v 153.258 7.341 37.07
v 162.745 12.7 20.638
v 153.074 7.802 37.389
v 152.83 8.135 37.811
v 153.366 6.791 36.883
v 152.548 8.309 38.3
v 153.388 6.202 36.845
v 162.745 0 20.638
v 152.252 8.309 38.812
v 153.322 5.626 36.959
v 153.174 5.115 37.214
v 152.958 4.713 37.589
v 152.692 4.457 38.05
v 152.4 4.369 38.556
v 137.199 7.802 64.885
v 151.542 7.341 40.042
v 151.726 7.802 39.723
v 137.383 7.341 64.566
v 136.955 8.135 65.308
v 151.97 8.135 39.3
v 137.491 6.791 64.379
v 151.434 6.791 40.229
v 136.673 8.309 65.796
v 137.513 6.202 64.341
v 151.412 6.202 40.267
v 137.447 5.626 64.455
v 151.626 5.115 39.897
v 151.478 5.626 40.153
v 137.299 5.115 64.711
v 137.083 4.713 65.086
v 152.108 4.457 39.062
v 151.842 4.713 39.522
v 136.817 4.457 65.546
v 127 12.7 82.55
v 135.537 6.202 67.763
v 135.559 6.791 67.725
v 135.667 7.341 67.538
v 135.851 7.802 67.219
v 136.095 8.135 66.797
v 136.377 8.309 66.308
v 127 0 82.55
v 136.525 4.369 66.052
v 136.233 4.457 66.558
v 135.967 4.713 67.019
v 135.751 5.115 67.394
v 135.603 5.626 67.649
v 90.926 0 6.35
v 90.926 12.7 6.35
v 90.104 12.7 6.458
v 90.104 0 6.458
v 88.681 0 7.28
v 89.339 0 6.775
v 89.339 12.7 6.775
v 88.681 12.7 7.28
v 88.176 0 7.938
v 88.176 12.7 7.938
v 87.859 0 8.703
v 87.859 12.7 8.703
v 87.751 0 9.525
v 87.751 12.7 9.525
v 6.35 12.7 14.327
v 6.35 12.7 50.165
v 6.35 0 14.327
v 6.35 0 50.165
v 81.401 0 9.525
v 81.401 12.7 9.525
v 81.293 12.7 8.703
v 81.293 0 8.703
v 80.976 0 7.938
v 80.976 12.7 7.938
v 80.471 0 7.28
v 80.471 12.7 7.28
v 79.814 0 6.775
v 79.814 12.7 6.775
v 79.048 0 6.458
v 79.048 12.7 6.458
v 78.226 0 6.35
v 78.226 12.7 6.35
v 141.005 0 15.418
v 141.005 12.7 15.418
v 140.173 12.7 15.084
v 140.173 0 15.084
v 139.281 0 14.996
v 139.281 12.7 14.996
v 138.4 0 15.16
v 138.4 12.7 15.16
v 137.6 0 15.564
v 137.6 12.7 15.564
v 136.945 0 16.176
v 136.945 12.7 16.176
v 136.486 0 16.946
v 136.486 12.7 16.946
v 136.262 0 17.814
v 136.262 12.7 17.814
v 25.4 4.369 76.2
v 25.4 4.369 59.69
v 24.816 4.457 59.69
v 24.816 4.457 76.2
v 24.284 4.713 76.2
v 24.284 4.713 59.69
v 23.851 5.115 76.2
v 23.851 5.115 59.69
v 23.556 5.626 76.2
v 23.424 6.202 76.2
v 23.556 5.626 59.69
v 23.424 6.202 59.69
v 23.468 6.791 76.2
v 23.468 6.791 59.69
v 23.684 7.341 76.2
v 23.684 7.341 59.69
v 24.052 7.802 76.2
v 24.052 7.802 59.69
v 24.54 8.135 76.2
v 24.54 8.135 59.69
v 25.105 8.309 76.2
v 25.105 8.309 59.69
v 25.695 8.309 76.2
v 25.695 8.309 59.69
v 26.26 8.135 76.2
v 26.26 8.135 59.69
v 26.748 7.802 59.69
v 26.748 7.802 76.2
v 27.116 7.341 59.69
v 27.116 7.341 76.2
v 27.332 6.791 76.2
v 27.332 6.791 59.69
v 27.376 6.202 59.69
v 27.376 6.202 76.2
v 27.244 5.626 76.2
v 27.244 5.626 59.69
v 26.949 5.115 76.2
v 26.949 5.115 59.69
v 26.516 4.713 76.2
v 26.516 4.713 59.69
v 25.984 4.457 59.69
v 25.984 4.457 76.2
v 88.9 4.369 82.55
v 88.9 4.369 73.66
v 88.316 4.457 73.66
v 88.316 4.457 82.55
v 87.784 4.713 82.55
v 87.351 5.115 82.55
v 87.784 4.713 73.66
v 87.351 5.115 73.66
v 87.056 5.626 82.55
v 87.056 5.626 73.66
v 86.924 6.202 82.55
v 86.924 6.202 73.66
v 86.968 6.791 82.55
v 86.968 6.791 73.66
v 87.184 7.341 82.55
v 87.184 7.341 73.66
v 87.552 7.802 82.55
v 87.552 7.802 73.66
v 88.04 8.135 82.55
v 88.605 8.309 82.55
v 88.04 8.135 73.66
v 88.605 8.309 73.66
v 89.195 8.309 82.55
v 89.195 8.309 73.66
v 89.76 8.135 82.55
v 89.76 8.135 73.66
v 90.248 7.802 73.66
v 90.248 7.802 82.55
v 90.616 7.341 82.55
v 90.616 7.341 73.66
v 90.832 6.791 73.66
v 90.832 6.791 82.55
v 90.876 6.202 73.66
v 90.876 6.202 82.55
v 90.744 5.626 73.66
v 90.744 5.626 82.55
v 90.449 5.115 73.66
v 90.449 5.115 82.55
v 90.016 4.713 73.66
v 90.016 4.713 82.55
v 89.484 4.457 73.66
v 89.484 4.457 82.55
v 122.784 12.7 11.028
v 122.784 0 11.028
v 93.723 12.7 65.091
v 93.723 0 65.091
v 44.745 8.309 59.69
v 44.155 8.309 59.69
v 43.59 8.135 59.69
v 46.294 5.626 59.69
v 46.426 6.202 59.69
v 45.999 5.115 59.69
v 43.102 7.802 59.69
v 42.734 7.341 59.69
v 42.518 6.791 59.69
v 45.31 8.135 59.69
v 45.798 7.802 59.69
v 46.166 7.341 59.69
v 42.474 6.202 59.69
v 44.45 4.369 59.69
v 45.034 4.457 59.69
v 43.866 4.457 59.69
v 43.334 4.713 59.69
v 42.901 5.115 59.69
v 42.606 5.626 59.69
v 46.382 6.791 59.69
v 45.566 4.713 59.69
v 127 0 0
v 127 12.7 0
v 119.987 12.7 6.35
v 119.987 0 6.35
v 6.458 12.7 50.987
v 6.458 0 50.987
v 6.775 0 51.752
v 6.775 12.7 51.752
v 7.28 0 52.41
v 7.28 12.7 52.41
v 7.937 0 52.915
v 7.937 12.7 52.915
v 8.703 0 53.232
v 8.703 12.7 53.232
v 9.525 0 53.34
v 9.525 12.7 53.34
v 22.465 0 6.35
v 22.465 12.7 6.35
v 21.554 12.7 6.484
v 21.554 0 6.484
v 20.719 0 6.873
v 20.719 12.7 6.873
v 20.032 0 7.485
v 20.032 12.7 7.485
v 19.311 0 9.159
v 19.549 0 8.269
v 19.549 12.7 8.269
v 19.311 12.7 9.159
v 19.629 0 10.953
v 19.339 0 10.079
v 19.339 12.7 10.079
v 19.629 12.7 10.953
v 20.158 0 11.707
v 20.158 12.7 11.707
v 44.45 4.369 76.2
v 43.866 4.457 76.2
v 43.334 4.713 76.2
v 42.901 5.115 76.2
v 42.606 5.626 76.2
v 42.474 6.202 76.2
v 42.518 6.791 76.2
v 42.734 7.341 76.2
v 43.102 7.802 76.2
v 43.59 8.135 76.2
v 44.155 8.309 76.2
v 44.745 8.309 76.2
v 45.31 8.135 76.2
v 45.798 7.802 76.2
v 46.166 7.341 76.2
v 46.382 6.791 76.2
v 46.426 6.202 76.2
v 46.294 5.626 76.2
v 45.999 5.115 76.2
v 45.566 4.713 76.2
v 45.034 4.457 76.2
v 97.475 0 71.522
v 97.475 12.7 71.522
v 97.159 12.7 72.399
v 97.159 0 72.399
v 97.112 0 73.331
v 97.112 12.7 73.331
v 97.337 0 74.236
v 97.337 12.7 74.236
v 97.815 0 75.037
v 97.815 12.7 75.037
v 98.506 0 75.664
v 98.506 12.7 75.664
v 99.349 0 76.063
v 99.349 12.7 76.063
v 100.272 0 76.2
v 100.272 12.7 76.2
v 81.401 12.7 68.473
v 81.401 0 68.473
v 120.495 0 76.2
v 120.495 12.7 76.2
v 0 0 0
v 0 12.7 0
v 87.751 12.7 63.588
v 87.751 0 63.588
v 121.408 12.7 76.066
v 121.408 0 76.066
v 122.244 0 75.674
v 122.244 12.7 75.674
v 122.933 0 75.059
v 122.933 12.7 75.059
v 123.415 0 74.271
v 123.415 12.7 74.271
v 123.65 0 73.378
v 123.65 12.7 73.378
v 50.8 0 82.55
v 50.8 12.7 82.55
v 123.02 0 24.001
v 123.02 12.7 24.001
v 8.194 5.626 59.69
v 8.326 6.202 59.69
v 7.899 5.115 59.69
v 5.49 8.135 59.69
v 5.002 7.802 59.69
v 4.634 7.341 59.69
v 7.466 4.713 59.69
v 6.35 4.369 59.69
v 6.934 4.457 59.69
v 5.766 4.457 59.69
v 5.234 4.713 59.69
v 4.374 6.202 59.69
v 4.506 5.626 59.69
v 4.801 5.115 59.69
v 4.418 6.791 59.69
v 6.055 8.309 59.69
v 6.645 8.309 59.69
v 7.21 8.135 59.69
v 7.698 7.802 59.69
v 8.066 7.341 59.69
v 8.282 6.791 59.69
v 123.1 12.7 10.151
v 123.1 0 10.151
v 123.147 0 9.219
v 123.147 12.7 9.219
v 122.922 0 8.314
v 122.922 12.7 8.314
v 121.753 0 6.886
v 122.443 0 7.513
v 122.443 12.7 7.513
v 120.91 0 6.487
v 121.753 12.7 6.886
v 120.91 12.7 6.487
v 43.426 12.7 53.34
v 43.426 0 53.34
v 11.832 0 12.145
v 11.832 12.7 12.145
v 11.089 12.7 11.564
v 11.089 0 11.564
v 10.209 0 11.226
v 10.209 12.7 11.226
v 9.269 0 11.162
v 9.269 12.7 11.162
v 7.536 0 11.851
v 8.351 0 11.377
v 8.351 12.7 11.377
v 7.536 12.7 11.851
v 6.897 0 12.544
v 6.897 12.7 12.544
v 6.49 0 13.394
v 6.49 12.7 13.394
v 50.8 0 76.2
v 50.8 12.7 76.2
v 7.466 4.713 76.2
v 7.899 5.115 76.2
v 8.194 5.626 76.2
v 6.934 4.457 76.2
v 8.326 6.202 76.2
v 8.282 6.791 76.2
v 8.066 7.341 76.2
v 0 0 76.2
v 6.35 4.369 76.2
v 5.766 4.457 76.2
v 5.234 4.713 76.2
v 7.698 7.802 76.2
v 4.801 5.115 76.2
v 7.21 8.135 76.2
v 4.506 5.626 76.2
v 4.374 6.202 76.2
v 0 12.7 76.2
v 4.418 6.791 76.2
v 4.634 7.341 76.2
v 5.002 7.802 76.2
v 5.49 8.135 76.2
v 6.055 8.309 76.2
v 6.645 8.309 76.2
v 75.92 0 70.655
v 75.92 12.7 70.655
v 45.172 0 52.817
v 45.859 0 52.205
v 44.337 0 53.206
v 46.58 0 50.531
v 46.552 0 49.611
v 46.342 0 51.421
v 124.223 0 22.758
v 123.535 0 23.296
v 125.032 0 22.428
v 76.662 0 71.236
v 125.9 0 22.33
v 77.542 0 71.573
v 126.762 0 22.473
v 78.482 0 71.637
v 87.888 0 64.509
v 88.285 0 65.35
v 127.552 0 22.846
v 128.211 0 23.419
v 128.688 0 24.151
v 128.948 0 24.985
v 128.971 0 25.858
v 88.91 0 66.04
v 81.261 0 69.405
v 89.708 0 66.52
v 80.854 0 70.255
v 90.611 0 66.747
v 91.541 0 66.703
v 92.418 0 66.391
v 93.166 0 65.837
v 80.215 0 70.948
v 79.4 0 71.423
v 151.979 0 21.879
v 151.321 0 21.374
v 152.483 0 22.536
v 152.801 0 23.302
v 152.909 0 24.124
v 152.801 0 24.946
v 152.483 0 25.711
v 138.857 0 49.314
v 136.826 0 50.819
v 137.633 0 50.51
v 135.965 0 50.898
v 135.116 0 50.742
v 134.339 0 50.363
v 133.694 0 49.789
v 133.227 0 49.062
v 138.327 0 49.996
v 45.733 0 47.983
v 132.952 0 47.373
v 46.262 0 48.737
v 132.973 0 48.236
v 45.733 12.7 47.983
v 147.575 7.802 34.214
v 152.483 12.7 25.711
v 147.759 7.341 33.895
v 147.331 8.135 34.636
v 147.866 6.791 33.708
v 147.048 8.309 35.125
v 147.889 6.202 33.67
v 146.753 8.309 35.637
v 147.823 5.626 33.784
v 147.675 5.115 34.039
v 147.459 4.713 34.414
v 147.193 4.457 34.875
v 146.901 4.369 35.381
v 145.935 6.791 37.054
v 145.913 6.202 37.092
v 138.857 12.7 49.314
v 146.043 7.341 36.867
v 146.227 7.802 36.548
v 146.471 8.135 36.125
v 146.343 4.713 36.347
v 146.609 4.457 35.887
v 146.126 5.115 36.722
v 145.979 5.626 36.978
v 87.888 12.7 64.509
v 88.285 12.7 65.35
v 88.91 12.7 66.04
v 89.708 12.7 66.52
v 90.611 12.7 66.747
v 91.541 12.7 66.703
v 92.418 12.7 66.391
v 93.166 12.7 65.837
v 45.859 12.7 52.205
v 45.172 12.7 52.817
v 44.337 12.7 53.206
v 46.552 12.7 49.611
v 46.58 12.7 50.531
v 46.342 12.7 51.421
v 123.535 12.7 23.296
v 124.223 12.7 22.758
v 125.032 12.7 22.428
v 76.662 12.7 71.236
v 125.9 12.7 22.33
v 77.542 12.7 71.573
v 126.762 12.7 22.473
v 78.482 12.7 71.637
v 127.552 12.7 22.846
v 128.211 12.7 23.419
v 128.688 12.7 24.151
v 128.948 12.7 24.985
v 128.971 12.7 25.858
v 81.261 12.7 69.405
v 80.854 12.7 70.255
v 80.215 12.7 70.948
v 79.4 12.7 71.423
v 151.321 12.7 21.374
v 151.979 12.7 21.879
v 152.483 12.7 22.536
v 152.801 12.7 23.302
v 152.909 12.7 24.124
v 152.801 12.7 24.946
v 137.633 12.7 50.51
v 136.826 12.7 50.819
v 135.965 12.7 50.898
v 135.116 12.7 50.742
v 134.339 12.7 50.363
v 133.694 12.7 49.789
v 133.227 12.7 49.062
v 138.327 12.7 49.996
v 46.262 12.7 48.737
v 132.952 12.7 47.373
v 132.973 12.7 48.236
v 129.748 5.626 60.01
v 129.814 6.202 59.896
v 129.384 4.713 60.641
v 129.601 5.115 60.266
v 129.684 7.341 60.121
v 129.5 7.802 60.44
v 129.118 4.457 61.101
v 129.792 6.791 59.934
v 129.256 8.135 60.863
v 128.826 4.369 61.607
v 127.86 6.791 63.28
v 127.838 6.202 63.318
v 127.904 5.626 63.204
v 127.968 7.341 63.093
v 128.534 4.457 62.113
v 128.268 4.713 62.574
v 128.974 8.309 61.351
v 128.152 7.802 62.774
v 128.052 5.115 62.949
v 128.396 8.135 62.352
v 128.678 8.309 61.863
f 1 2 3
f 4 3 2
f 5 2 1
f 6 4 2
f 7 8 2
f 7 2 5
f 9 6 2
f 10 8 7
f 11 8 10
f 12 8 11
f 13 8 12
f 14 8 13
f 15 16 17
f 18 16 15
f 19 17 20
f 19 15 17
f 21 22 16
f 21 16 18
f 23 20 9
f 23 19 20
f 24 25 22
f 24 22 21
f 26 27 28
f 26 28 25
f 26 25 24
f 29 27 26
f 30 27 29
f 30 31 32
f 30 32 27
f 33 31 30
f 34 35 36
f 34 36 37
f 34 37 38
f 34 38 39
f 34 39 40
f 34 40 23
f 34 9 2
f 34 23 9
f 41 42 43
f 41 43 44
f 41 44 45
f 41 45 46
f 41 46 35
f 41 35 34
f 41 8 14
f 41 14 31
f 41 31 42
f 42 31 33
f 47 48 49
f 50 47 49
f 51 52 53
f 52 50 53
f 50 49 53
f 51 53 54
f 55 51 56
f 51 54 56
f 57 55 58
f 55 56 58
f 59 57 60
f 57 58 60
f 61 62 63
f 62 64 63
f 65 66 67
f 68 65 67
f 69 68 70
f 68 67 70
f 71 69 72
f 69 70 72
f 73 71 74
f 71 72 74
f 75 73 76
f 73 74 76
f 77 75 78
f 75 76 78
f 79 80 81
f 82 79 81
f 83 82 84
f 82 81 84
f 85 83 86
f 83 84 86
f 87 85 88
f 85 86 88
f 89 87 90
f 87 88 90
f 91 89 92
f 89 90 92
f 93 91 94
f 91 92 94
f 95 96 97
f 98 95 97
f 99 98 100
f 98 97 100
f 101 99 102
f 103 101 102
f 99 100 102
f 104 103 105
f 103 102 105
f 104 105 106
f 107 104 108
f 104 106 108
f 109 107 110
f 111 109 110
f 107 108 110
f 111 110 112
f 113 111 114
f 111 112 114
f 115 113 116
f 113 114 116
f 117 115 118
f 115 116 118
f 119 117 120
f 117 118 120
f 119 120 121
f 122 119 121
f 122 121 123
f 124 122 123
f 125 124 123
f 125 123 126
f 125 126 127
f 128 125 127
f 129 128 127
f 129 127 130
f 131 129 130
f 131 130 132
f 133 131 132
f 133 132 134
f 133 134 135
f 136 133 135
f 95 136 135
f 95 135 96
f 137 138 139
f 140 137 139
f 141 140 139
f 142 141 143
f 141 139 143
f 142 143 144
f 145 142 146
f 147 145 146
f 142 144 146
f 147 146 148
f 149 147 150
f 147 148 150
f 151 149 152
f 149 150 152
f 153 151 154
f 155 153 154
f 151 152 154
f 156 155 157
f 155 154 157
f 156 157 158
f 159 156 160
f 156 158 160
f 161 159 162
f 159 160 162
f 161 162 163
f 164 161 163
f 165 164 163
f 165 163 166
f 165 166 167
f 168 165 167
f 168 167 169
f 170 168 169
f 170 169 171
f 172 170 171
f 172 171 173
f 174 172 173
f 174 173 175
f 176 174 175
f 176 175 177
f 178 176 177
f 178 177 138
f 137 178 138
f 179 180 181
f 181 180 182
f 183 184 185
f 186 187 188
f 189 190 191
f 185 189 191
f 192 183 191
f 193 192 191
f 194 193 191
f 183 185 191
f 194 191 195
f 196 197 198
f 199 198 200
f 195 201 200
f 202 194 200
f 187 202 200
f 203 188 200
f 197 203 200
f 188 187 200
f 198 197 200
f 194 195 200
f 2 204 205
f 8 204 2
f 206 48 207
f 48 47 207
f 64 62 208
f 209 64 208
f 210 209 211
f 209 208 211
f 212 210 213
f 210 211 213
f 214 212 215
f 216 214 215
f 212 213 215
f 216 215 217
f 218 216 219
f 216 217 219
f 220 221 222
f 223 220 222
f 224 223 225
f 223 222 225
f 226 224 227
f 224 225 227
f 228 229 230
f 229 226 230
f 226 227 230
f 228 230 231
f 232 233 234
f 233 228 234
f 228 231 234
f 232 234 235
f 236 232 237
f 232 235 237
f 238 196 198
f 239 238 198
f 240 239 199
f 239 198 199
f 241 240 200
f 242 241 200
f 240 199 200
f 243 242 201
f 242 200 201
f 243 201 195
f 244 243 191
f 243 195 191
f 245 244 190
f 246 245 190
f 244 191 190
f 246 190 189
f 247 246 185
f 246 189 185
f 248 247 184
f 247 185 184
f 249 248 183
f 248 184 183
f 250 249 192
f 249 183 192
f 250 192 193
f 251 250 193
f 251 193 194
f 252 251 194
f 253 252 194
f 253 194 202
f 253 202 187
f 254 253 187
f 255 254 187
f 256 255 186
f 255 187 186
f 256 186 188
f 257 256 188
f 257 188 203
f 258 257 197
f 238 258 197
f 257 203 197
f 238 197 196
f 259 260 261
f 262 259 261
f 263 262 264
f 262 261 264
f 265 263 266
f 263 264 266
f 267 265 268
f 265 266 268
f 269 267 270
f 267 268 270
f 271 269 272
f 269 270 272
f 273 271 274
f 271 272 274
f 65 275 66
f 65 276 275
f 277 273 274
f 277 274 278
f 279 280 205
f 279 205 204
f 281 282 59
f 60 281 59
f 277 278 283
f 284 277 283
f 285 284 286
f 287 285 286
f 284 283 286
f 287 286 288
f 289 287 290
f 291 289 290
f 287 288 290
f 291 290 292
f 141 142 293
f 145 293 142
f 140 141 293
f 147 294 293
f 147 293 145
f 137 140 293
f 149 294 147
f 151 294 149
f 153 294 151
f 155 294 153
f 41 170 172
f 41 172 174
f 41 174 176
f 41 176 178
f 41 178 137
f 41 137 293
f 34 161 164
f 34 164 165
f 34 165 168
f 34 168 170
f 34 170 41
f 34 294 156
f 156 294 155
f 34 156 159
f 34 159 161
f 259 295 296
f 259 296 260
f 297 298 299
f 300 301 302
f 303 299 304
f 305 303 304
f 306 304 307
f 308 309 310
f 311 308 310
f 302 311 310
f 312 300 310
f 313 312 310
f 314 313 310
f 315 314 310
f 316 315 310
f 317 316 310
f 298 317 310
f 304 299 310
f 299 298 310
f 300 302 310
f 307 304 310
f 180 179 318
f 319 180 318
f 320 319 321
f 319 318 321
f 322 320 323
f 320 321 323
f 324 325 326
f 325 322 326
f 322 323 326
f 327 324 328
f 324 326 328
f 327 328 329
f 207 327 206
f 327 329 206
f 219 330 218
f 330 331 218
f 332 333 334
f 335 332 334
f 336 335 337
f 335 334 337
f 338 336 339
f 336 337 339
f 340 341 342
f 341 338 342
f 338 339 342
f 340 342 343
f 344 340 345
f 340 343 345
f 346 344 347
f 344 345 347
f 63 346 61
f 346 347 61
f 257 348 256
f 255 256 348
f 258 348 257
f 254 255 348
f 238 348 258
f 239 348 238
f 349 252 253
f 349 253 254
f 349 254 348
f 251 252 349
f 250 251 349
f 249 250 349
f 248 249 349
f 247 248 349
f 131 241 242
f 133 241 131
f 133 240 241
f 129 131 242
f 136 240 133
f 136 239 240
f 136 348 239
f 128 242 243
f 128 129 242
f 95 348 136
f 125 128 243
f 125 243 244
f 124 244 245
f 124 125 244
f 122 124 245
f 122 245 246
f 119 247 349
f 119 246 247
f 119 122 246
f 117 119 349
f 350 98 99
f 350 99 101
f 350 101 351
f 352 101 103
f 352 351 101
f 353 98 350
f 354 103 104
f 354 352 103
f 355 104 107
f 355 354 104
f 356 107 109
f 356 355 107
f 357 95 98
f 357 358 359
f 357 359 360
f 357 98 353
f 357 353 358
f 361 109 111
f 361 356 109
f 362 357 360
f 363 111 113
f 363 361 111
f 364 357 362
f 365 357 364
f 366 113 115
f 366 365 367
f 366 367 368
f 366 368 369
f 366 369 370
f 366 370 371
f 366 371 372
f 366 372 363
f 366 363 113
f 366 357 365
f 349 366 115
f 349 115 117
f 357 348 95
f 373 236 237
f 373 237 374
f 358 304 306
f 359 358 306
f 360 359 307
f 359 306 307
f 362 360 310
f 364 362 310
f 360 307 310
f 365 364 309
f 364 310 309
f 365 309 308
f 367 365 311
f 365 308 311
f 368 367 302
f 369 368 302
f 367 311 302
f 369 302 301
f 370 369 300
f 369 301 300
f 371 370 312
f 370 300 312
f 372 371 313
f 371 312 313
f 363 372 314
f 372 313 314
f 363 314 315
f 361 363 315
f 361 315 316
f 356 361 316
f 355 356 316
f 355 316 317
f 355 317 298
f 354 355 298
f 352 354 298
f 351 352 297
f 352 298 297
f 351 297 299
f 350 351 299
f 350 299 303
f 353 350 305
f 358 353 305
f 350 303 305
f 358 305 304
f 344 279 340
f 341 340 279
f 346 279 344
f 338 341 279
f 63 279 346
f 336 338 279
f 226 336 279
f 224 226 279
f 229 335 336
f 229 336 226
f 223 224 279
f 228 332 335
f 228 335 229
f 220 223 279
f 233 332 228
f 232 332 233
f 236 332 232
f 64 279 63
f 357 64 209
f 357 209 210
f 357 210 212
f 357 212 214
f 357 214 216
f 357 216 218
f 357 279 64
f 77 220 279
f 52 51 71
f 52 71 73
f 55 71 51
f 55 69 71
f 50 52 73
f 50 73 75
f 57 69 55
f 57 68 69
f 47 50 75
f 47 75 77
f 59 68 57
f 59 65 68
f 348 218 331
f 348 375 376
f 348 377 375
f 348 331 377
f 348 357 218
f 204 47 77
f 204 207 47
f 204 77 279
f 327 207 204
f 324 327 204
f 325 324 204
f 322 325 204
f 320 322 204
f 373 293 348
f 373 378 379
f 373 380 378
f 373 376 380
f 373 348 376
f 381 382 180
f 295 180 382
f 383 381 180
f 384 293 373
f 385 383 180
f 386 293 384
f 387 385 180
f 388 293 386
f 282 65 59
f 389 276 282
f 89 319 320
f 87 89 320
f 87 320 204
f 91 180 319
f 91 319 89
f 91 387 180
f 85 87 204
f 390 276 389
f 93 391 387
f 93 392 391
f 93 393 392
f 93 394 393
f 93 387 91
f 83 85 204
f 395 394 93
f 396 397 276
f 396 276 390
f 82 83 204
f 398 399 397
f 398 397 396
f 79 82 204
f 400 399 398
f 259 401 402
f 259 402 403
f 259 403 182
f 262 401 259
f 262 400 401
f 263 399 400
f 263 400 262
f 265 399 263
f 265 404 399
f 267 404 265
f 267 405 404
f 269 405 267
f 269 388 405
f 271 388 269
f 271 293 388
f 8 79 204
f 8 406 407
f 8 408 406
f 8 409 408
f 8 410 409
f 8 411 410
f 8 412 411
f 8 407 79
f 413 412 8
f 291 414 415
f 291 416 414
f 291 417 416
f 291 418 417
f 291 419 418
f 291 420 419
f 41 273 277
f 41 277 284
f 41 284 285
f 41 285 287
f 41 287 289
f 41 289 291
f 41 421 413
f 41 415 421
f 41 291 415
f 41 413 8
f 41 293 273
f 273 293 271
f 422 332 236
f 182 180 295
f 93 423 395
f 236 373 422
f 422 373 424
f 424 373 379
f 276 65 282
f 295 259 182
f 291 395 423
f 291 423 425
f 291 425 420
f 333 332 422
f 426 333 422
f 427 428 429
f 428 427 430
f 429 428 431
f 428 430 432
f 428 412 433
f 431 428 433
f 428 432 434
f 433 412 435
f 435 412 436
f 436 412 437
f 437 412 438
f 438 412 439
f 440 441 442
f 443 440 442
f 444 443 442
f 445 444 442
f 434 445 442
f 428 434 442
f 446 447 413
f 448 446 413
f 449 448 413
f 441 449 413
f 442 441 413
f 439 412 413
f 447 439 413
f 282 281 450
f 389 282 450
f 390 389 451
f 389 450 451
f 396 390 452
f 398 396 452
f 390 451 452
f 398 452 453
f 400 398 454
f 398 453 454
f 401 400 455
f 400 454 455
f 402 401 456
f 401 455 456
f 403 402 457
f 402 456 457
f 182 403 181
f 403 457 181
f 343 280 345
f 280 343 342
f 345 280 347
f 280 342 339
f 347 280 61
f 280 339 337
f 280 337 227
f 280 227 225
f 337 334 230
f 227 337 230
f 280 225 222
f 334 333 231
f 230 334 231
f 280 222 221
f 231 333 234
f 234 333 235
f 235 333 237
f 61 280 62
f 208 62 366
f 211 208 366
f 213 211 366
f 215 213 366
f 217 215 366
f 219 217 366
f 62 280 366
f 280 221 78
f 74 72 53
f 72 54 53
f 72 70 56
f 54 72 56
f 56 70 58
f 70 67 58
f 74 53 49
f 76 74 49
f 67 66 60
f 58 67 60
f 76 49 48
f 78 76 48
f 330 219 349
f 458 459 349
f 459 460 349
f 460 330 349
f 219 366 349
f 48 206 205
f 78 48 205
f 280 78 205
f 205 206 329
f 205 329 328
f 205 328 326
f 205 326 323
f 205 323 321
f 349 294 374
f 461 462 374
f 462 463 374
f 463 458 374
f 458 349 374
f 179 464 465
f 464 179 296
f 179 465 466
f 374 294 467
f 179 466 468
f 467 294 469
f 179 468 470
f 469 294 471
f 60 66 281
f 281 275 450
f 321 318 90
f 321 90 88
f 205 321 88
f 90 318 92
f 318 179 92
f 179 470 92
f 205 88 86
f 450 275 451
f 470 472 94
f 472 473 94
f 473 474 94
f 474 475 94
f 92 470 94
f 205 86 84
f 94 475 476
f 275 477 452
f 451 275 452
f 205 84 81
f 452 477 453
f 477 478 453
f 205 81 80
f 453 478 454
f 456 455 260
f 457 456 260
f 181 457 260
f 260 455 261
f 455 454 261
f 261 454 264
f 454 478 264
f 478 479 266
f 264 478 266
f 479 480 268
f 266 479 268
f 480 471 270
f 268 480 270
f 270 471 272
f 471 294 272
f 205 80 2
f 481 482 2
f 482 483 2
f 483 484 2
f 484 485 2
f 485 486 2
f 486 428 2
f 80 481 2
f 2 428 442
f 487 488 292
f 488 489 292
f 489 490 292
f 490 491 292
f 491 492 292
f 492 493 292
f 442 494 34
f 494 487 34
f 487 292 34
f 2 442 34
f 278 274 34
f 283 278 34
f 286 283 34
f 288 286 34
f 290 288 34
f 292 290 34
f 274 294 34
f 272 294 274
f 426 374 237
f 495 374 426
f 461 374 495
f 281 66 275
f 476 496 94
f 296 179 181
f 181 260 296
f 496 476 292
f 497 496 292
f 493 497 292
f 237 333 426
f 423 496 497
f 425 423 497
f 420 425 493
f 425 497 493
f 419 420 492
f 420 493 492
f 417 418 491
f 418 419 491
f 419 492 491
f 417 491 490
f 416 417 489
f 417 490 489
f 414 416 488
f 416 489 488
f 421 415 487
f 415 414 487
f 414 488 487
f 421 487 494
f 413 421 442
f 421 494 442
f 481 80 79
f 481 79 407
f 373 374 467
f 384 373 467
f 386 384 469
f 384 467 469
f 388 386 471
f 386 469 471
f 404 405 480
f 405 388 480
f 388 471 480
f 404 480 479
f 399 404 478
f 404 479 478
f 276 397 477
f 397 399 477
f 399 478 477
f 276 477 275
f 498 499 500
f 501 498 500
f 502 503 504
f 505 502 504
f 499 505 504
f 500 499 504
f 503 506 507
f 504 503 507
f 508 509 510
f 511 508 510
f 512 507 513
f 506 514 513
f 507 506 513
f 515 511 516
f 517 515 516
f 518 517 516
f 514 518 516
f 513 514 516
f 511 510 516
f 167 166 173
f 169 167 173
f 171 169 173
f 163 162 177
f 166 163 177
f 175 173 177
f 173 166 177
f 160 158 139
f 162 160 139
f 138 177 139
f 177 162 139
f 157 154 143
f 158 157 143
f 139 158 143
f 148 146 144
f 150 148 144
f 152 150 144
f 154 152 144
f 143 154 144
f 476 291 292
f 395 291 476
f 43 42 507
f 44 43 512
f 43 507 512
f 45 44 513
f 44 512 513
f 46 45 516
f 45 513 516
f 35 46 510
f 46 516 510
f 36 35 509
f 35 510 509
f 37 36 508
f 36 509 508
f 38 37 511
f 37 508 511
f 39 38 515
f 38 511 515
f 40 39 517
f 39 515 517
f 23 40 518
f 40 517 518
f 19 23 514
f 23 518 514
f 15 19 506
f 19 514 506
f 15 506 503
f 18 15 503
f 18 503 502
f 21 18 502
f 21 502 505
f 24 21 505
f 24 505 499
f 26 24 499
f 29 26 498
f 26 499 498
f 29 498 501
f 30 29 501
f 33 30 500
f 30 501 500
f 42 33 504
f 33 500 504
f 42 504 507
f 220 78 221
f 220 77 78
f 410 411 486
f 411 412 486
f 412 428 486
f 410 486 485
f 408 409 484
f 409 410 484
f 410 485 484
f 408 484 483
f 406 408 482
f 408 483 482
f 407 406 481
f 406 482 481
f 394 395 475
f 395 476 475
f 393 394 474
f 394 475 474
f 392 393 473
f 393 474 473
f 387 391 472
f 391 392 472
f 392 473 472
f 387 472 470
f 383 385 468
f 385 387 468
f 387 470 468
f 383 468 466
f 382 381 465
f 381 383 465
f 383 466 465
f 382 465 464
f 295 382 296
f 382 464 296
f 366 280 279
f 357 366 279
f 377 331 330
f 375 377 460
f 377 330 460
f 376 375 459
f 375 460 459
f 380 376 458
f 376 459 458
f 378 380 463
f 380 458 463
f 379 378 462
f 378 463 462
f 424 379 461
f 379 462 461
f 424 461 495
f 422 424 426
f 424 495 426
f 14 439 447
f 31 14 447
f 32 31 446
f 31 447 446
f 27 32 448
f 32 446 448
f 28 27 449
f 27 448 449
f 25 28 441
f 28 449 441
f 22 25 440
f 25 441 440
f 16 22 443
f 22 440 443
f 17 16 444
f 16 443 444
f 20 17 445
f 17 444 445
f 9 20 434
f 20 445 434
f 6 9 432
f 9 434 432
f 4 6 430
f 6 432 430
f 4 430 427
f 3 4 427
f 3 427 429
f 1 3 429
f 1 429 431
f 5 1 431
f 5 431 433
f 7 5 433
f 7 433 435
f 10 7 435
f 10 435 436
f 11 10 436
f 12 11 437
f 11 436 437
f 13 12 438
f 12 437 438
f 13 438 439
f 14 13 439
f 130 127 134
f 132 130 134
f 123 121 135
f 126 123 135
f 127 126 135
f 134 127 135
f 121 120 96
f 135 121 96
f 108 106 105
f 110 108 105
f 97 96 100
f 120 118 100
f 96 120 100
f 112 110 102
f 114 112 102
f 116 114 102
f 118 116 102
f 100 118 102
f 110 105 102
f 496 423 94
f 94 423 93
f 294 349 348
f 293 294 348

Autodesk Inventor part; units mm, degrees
ref_plane "YZ Plane" through (0, 0, 0) normal (1, 0, 0) x (0, 1, 0)
ref_plane "XZ Plane" through (0, 0, 0) normal (0, 1, 0) x (-1, 0, 0)
ref_plane "XY Plane" through (0, 0, 0) normal (0, 0, 1) x (1, 0, 0)
sketch "Sketch1" plane through (0, 0, 0) normal (0, 0, 1) x (1, 0, 0)
  line L0 (0, 0) -> (50.8, 0)
  line L1 (50.8, 0) -> (50.8, 12.7)
  line L2 (50.8, 12.7) -> (0, 12.7)
  line L3 (0, 12.7) -> (0, 0)
  dimension "d0" = 50.8
  dimension "d1" = 12.7
extrude "Extrusion1" add sketch "Sketch1" along normal blind 76.2
sketch "Sketch2" plane through (0, 0, 76.2) normal (0, 0, 1) x (1, 0, 0)
  line L0 (50.8, 12.7) -> (0, 12.7) construction
  line L1 (50.8, 0) -> (50.8, 12.7) construction
  line L2 (0, 12.7) -> (50.8, 12.7) construction
  line L3 (50.8, 12.7) -> (50.8, 6.35) construction
  line L4 (50.8, 6.35) -> (0, 6.35) construction
  line L5 (0, 6.35) -> (0, 12.7) construction
  point P0 (0, 0)
  point P1 (25.4, 6.35)
  point P2 (6.35, 6.35)
  point P3 (44.45, 6.35)
  dimension "d4" = 6.35
  dimension "d5" = 19.05
  dimension "d6" = 19.05
hole "Hole1" at (25.4, 6.35, 76.2) at (6.35, 6.35, 76.2) at (44.45, 6.35, 76.2) direction (0, 0, -1) diameter 3.9624 depth 16.51 thread size "10-32 UNF" class "2B" standard "ANSI Unified Screw Threads"
sketch "Sketch3" plane through (50.8, 0, 0) normal (1, 0, 0) x (0, 0, -1)
  line L0 (0, 0) -> (-76.2, 0) projected
  line L1 (-76.2, 0) -> (-76.2, 12.7) projected
  line L2 (0, 0) -> (-76.2, 0)
  line L3 (-76.2, 0) -> (-76.2, 12.7)
  line L4 (-76.2, 12.7) -> (0, 12.7)
  line L5 (0, 12.7) -> (0, 0)
extrude "Extrusion2" add sketch "Sketch3" along normal blind 76.2
sketch "Sketch4" plane through (0, 0, 76.2) normal (0, 0, 1) x (1, 0, 0)
  line L0 (0, 12.7) -> (127, 12.7) projected
  line L1 (0, 0) -> (127, 0) projected
  line L2 (127, 12.7) -> (50.8, 12.7)
  line L3 (50.8, 12.7) -> (50.8, 0)
  line L4 (50.8, 0) -> (127, 0)
  line L5 (127, 0) -> (127, 12.7)
  dimension "d16" = 76.2
extrude "Extrusion3" add sketch "Sketch4" along normal blind 6.35
sketch "Sketch5" plane through (0, 0, 0) normal (0, -1, 0) x (1, 0, 0)
  line L0 (127, 0) -> (162.7452, 20.6375)
  line L1 (127, 0) -> (168.275, 0) construction
  line L2 (127, 0) -> (127, 82.55) projected
  line L3 (162.7452, 20.6375) -> (127, 82.55)
  line L4 (127, 82.55) -> (127, 0)
  point P0 (0, 0)
  dimension "d19" = 41.275
  dimension "d20" = 30
extrude "Extrusion4" add sketch "Sketch5" against normal up to surface (12.7 mm away)
sketch "Sketch6" plane through (0, 0, 76.2) normal (0, 1, 0) x (1, 0, 0)
  line L0 (4.3688, 16.51) -> (8.3312, 16.51) projected
  line L1 (8.3312, 0) -> (4.3688, 0) projected
  line L2 (8.3312, 0) -> (4.3688, 0) projected
  line L3 (4.3688, 16.51) -> (8.3312, 16.51) projected
  line L4 (0, 76.2) -> (0, 0) projected
  line L5 (0, 16.51) -> (50.8, 16.51)
  line L6 (50.8, 0) -> (50.8, -6.35) projected
  line L7 (50.8, 16.51) -> (50.8, 0)
  line L8 (0, 76.2) -> (127, 76.2) projected
  line L9 (6.35, 22.86) -> (6.35, 69.85)
  line L10 (6.35, 69.85) -> (50.8, 22.86)
  line L11 (50.8, 22.86) -> (6.35, 22.86)
  line L12 (57.15, 16.1471) -> (57.15, 0)
  line L13 (57.15, 0) -> (72.4243, 0)
  line L14 (72.4243, 0) -> (57.15, 16.1471)
  line L15 (127, -6.35) -> (50.8, -6.35) projected
  line L16 (6.35, 69.85) -> (10.9631, 74.2137) construction
  line L17 (10.9631, 74.2137) -> (15.0909, 69.85) construction
  line L18 (15.0909, 69.85) -> (81.4011, -0.2494)
  line L19 (81.4011, -0.2494) -> (81.4011, 69.85)
  line L20 (81.4011, 69.85) -> (15.0909, 69.85)
  line L21 (127, 76.2) -> (162.7452, 55.5625) projected
  line L22 (72.4243, 0) -> (77.0374, 4.3637) construction
  line L23 (77.0374, 4.3637) -> (81.4011, -0.2494) construction
  line L24 (87.7511, 0) -> (87.7511, 69.85)
  line L25 (87.7511, 69.85) -> (125.2985, 69.85)
  line L26 (125.2985, 69.85) -> (87.7511, 0)
  line L27 (130.8003, 66.6735) -> (94.9604, 0)
  line L28 (94.9604, 0) -> (123.3338, 0)
  line L29 (123.3338, 0) -> (130.8003, 66.6735)
  line L30 (162.7452, 55.5625) -> (127, -6.35) projected
  line L31 (136.802, 63.2085) -> (154.0709, 53.2382)
  line L32 (154.0709, 53.2382) -> (131.2611, 13.7305)
  line L33 (131.2611, 13.7305) -> (136.802, 63.2085)
  point P0 (6.35, 16.51)
  point P1 (57.15, 8.0736)
  point P2 (145.4365, 58.2234)
  dimension "d23" = 50.8
  dimension "d24" = 6.35
  dimension "d25" = 6.35
  dimension "d26" = 6.35
  dimension "d27" = 6.35
  dimension "d28" = 0
  dimension "d29" = 6.35
  dimension "d30" = 6.35
  dimension "d31" = 6.35
  dimension "d33" = 6.35
  dimension "d34" = 6.35
  dimension "d39" = 6.35
  dimension "d40" = 6.35
  dimension "d41" = 6.35
  dimension "d42" = 6.35
  dimension "d43" = 6.35
  dimension "d44" = 6.35
  dimension "d45" = 6.35
  dimension "d46" = 6.35
  dimension "d47" = 6.35
  dimension "d48" = 6.35
  dimension "d49" = 6.35
  dimension "d50" = 6.35
  dimension "d51" = 6.35
extrude "Extrusion5" cut sketch "Sketch6" along normal through all contours L9 L10 L11 | L20 L19 L18 | L24 L25 L26 | L29 L28 L27 | L31 L32 L33
fillet "Fillet1" radius 3.175 15 edges at (130.8003, 6.35, 9.5265) (136.802, 6.35, 12.9915) (154.0709, 6.35, 22.9618) (131.2611, 6.35, 62.4695) (94.9604, 6.35, 76.2) (123.3338, 6.35, 76.2) (125.2985, 6.35, 6.35) (87.7511, 6.35, 6.35) (87.7511, 6.35, 76.2) (81.4011, 6.35, 76.4494) (81.4011, 6.35, 6.35) (15.0909, 6.35, 6.35) (6.35, 6.35, 53.34) (50.8, 6.35, 53.34) (6.35, 6.35, 6.35)
sketch "Sketch7" plane through (0, 0, 82.55) normal (0, 0, 1) x (1, 0, 0)
  line L0 (127, 0) -> (127, 12.7) construction
  line L1 (127, 6.35) -> (50.8, 6.35) construction
  line L2 (50.8, 12.7) -> (50.8, 0) construction
  point P0 (0, 0)
  point P1 (88.9, 6.35)
hole "Hole2" at (88.9, 6.35, 82.55) direction (0, 0, -1) diameter 3.9624 depth 8.89 thread size "10-32 UNF" class "2B" standard "ANSI Unified Screw Threads"
sketch "Sketch8" plane through (127, 0, 82.55) normal (0.8660254, 0, 0.5) x (0.5, 0, -0.8660254)
  line L0 (0, 0) -> (0, 12.7) construction
  line L1 (71.4904, 0) -> (71.4904, 12.7) construction
  line L2 (61.9654, 12.7) -> (34.7119, 12.7) construction
  point P0 (7.9904, 0)
  point P1 (19.05, 6.35)
  point P2 (50.8, 6.35)
  dimension "d69" = 19.05
  dimension "d70" = 31.75
hole "Hole3" at (136.525, 6.35, 66.0522) at (152.4, 6.35, 38.5559) direction (-0.8660254, 0, -0.5) diameter 3.9624 depth 8.89 thread size "10-32 UNF" class "2B" standard "ANSI Unified Screw Threads"
sketch "Sketch9" plane through (0, 0, 0) normal (-1, 0, 0) x (0, 0, 1)
  line L0 (0, 12.7) -> (0, 0) construction
  line L1 (0, 6.35) -> (76.2, 6.35) construction
  point P0 (19.05, 6.35)
  point P1 (44.45, 6.35)
  point P2 (31.75, 6.35)
  dimension "d71" = 25.4
  dimension "d72" = 19.05
  dimension "d73" = 12.7
hole "Hole4" [suppressed]
chamfer "Chamfer1" [suppressed]
sketch "Sketch10" plane through (0, 0, 0) normal (0, -1, 0) x (1, 0, 0)
  line L0 (78.2261, 6.35) -> (22.4648, 6.35) construction
  line L1 (78.2261, 6.35) -> (81.4011, 6.35) construction
  arc A0 (78.2261, 6.35) -> (81.4011, 9.525) centre (78.2261, 9.525) ccw construction
  line L2 (81.4011, 6.35) -> (81.4011, 9.525) construction
  point P0 (0, 0)
  dimension "d84" = 3.175
sketch "Sketch11" plane through (0, 12.7, 76.2) normal (0, 1, 0) x (1, 0, 0)
  line L0 (78.2261, 69.85) -> (81.4011, 69.85) construction
  line L1 (81.4011, 69.85) -> (81.4011, 66.675) construction
  point P0 (0, 76.2)
properties part number "Third Baseplate"
